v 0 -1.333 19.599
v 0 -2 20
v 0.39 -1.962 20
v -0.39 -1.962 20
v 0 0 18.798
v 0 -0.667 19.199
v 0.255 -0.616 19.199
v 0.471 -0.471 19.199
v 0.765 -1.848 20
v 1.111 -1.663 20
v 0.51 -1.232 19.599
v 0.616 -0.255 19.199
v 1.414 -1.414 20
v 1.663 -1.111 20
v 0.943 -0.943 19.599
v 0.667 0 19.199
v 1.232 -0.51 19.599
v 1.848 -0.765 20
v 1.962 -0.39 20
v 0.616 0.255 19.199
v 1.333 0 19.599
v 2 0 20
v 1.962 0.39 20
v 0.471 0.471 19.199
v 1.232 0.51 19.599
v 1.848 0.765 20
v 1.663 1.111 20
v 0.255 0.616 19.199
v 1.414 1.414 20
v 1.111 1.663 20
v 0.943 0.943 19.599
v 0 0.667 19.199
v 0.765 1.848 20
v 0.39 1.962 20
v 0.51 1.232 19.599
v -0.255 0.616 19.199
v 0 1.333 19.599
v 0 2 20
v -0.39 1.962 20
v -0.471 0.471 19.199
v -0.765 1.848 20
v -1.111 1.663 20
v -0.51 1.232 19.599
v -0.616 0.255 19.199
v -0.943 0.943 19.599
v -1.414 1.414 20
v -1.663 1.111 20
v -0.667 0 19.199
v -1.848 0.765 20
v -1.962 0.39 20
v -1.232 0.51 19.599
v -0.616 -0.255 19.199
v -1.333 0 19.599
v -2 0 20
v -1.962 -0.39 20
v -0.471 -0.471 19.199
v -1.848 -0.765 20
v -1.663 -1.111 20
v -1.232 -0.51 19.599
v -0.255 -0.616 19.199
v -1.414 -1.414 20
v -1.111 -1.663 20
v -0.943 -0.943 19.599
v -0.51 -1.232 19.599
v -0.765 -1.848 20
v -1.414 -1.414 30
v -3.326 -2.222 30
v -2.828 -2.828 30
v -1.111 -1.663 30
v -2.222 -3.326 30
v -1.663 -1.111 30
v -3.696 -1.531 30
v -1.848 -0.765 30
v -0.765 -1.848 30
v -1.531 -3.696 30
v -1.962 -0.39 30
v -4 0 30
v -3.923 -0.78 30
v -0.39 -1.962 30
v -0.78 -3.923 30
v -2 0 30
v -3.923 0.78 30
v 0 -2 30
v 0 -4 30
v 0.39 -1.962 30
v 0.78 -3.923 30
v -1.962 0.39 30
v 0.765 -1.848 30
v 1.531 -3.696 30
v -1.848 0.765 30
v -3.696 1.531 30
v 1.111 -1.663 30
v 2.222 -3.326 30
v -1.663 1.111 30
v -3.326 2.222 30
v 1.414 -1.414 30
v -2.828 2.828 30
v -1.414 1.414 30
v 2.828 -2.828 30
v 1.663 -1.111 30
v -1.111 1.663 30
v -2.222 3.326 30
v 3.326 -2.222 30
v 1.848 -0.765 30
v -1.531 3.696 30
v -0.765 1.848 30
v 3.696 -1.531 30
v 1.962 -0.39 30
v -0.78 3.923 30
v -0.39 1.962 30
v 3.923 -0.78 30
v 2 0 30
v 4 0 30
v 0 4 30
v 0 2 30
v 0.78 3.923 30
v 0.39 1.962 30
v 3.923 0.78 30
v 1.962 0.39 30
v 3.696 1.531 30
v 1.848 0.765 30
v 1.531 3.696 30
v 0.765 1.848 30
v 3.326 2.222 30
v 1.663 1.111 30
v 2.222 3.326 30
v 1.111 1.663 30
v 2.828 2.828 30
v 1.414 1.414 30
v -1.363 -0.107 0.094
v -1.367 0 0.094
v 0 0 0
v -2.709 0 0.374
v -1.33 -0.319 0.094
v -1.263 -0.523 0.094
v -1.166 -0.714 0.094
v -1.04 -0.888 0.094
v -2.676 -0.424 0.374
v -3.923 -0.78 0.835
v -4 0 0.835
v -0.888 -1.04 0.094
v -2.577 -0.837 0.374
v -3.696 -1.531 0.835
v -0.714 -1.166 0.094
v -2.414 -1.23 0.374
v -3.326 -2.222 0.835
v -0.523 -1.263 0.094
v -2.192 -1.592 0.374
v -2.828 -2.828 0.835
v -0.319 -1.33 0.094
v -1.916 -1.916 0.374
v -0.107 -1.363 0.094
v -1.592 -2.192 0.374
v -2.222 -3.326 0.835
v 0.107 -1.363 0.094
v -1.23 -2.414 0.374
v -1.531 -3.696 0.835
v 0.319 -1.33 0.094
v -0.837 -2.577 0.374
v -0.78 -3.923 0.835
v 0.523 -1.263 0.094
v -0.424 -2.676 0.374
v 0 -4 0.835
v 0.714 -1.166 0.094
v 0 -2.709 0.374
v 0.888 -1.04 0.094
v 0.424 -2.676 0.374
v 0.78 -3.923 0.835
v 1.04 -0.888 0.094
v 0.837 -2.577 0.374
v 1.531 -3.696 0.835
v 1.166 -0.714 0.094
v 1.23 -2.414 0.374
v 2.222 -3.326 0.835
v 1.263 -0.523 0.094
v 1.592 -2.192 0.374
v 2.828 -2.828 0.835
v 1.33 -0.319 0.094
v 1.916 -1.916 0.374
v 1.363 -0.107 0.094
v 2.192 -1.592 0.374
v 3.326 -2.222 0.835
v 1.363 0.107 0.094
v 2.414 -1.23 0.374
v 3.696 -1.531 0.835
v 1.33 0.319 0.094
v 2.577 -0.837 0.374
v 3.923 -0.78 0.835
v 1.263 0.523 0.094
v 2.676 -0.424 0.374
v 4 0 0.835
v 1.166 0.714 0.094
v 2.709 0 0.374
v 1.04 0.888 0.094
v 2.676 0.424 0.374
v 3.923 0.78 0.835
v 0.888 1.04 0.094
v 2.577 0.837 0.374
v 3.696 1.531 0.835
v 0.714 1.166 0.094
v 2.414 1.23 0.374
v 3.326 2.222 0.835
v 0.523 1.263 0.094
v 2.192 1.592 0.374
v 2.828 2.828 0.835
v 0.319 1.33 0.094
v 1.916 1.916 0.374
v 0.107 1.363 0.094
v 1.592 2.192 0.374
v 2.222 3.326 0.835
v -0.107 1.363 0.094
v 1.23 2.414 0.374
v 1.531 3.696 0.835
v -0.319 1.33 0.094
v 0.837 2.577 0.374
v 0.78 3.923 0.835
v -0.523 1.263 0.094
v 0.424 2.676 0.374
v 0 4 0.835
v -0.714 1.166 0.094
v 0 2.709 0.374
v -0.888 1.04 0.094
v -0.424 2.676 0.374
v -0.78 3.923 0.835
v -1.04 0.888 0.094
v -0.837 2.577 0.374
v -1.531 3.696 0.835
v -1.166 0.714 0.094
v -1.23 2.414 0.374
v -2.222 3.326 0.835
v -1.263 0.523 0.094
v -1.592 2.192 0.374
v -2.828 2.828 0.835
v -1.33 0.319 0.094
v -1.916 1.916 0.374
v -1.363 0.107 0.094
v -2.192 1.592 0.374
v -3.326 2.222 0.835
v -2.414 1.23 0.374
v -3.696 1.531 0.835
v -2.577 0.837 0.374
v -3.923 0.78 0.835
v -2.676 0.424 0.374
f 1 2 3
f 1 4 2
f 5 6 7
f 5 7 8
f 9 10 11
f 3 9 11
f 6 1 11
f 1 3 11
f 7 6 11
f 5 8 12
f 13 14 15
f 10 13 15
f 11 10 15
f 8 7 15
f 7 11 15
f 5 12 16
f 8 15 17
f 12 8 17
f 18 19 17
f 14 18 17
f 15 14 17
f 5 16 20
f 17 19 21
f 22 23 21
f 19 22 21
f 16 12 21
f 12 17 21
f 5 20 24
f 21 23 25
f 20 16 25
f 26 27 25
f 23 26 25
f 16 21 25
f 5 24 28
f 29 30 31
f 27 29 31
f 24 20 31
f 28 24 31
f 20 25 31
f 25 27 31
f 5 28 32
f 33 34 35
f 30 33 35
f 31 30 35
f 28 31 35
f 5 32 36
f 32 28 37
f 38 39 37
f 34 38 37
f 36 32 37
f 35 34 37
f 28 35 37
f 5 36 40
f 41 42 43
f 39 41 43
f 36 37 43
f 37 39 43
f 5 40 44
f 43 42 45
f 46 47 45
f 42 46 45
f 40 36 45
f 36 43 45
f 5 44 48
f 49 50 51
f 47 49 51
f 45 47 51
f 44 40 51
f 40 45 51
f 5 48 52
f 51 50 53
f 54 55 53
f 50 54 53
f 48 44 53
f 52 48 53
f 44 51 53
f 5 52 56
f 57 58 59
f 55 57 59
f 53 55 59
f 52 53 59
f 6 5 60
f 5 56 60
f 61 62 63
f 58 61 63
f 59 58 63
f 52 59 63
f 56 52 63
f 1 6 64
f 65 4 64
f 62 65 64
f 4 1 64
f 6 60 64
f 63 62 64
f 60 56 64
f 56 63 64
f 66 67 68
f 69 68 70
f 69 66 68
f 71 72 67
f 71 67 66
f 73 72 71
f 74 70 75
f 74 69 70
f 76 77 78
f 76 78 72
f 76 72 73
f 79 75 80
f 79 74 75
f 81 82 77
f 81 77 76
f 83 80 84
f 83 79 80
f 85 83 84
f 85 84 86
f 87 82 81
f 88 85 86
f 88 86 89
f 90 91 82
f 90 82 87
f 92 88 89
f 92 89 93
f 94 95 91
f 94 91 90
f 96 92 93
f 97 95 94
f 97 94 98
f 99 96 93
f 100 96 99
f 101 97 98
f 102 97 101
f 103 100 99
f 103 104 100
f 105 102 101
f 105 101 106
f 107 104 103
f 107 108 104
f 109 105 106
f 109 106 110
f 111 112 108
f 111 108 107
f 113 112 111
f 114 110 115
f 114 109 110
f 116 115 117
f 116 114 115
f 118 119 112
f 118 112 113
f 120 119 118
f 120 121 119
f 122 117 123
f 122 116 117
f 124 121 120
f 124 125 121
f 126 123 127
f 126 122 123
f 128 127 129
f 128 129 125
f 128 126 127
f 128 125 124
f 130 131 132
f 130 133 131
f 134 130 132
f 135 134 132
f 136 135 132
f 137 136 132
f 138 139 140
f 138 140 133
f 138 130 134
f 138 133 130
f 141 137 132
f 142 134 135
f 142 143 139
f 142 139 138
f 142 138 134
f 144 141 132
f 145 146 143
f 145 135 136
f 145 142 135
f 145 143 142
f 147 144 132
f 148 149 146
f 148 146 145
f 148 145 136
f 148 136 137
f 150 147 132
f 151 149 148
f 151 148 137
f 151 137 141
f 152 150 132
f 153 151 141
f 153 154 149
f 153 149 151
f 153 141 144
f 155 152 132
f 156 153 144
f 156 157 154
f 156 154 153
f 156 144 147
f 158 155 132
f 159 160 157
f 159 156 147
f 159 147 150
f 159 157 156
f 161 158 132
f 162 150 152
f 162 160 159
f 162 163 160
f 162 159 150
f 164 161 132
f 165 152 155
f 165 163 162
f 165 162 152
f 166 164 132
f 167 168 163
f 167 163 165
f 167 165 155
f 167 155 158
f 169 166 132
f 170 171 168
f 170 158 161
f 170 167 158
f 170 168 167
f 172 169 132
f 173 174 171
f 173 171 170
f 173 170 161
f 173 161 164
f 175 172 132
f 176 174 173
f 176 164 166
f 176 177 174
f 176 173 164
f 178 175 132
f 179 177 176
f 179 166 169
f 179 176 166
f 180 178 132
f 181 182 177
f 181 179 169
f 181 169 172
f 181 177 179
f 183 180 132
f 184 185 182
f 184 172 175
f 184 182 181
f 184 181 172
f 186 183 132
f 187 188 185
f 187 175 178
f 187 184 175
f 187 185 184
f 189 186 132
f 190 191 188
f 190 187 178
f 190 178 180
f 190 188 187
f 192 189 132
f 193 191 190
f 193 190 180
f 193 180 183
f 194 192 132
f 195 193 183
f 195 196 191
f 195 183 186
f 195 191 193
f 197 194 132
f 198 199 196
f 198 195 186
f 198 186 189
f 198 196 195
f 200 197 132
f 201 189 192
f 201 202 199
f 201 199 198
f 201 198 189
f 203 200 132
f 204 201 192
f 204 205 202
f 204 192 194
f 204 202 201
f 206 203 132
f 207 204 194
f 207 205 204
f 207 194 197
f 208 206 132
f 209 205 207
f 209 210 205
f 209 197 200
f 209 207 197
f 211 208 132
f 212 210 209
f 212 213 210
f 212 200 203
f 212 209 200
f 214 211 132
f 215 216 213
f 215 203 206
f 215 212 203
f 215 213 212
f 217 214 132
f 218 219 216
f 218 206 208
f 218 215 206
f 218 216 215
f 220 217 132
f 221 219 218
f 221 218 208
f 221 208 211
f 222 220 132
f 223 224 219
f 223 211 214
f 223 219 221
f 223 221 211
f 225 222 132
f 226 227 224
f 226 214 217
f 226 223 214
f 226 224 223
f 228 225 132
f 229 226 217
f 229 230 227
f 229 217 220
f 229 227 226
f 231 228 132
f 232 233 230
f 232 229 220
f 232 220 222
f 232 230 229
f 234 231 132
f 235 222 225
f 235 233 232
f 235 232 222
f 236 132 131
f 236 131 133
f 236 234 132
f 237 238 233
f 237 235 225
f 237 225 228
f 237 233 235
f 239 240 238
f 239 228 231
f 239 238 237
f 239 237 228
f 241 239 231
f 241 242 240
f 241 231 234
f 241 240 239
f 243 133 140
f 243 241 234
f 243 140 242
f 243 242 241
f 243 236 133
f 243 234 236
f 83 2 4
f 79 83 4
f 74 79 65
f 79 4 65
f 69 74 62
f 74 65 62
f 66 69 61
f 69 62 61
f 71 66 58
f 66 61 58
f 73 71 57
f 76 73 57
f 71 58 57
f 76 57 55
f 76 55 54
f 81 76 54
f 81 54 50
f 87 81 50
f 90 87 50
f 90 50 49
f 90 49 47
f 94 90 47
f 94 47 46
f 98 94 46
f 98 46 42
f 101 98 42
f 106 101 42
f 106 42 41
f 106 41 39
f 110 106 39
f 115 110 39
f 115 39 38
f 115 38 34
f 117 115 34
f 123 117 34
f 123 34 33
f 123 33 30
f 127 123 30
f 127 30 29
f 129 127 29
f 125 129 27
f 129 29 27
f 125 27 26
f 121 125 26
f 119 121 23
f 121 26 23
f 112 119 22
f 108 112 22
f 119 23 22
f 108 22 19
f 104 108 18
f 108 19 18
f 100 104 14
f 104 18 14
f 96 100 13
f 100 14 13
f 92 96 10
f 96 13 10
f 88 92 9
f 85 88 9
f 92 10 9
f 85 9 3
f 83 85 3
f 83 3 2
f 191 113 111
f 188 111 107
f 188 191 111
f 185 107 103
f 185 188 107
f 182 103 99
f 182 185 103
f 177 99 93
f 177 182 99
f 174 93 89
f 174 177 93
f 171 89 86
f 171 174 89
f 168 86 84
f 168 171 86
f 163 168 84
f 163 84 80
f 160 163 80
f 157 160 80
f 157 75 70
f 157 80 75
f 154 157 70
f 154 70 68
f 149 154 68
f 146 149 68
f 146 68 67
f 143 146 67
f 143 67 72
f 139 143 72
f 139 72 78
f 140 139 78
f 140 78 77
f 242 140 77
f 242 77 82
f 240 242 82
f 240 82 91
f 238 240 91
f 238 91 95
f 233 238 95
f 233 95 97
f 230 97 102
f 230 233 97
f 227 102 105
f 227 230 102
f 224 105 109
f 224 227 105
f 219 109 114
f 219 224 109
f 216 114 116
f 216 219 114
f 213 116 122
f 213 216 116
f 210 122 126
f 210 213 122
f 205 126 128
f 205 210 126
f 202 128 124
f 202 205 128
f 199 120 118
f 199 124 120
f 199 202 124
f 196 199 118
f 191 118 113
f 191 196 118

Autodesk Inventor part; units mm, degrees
ref_plane "YZ Plane" through (0, 0, 0) normal (1, 0, 0) x (0, 1, 0)
ref_plane "XZ Plane" through (0, 0, 0) normal (0, 1, 0) x (-1, 0, 0)
ref_plane "XY Plane" through (0, 0, 0) normal (0, 0, 1) x (1, 0, 0)
sketch "Skizze_Grudnkörper" plane through (0, 0, 0) normal (0, 0, 1) x (1, 0, 0)
  circle A0 centre (0, 0) radius 4
  dimension "d0" = 8
extrude "Grundkörper" add sketch "Skizze_Grudnkörper" along normal blind 30
hole "Bohrung_4_mm" at (0, 0, 30) direction (0, 0, -1) diameter 4 depth 10 tip angle 118
sketch "Skizze2" plane through (0, 0, 0) normal (0, 1, 0) x (-1, 0, 0)
  line L0 (-4, 0) -> (-4, 30) projected
  line L1 (-4, 30) -> (-2, 30) projected
  line L2 (-2, 30) -> (-2, 20) projected
  line L3 (-2, 20) -> (0, 18.7983) projected
  line L4 (0, 18.7983) -> (2, 20) projected
  line L5 (2, 20) -> (2, 30) projected
  line L6 (2, 30) -> (4, 30) projected
  line L7 (4, 30) -> (4, 0) projected
  line L8 (4, 0) -> (-4, 0) projected
  line L9 (5.6, 0) -> (-5.6, 0) projected
  line L10 (0, -6) -> (0, 36) projected
  circle A0 centre (0, 10) radius 10
  point P0 (0, 0)
  point P1 (4, 0.8348)
  point P2 (0, 0)
  dimension "d12" = 20
revolve "Kugel" cut sketch "Skizze2" angle 360 about axis through (0, 0, -10) along (0, 0, 1) contours A0 L7 L8
properties material "Stahl, Legierung"
